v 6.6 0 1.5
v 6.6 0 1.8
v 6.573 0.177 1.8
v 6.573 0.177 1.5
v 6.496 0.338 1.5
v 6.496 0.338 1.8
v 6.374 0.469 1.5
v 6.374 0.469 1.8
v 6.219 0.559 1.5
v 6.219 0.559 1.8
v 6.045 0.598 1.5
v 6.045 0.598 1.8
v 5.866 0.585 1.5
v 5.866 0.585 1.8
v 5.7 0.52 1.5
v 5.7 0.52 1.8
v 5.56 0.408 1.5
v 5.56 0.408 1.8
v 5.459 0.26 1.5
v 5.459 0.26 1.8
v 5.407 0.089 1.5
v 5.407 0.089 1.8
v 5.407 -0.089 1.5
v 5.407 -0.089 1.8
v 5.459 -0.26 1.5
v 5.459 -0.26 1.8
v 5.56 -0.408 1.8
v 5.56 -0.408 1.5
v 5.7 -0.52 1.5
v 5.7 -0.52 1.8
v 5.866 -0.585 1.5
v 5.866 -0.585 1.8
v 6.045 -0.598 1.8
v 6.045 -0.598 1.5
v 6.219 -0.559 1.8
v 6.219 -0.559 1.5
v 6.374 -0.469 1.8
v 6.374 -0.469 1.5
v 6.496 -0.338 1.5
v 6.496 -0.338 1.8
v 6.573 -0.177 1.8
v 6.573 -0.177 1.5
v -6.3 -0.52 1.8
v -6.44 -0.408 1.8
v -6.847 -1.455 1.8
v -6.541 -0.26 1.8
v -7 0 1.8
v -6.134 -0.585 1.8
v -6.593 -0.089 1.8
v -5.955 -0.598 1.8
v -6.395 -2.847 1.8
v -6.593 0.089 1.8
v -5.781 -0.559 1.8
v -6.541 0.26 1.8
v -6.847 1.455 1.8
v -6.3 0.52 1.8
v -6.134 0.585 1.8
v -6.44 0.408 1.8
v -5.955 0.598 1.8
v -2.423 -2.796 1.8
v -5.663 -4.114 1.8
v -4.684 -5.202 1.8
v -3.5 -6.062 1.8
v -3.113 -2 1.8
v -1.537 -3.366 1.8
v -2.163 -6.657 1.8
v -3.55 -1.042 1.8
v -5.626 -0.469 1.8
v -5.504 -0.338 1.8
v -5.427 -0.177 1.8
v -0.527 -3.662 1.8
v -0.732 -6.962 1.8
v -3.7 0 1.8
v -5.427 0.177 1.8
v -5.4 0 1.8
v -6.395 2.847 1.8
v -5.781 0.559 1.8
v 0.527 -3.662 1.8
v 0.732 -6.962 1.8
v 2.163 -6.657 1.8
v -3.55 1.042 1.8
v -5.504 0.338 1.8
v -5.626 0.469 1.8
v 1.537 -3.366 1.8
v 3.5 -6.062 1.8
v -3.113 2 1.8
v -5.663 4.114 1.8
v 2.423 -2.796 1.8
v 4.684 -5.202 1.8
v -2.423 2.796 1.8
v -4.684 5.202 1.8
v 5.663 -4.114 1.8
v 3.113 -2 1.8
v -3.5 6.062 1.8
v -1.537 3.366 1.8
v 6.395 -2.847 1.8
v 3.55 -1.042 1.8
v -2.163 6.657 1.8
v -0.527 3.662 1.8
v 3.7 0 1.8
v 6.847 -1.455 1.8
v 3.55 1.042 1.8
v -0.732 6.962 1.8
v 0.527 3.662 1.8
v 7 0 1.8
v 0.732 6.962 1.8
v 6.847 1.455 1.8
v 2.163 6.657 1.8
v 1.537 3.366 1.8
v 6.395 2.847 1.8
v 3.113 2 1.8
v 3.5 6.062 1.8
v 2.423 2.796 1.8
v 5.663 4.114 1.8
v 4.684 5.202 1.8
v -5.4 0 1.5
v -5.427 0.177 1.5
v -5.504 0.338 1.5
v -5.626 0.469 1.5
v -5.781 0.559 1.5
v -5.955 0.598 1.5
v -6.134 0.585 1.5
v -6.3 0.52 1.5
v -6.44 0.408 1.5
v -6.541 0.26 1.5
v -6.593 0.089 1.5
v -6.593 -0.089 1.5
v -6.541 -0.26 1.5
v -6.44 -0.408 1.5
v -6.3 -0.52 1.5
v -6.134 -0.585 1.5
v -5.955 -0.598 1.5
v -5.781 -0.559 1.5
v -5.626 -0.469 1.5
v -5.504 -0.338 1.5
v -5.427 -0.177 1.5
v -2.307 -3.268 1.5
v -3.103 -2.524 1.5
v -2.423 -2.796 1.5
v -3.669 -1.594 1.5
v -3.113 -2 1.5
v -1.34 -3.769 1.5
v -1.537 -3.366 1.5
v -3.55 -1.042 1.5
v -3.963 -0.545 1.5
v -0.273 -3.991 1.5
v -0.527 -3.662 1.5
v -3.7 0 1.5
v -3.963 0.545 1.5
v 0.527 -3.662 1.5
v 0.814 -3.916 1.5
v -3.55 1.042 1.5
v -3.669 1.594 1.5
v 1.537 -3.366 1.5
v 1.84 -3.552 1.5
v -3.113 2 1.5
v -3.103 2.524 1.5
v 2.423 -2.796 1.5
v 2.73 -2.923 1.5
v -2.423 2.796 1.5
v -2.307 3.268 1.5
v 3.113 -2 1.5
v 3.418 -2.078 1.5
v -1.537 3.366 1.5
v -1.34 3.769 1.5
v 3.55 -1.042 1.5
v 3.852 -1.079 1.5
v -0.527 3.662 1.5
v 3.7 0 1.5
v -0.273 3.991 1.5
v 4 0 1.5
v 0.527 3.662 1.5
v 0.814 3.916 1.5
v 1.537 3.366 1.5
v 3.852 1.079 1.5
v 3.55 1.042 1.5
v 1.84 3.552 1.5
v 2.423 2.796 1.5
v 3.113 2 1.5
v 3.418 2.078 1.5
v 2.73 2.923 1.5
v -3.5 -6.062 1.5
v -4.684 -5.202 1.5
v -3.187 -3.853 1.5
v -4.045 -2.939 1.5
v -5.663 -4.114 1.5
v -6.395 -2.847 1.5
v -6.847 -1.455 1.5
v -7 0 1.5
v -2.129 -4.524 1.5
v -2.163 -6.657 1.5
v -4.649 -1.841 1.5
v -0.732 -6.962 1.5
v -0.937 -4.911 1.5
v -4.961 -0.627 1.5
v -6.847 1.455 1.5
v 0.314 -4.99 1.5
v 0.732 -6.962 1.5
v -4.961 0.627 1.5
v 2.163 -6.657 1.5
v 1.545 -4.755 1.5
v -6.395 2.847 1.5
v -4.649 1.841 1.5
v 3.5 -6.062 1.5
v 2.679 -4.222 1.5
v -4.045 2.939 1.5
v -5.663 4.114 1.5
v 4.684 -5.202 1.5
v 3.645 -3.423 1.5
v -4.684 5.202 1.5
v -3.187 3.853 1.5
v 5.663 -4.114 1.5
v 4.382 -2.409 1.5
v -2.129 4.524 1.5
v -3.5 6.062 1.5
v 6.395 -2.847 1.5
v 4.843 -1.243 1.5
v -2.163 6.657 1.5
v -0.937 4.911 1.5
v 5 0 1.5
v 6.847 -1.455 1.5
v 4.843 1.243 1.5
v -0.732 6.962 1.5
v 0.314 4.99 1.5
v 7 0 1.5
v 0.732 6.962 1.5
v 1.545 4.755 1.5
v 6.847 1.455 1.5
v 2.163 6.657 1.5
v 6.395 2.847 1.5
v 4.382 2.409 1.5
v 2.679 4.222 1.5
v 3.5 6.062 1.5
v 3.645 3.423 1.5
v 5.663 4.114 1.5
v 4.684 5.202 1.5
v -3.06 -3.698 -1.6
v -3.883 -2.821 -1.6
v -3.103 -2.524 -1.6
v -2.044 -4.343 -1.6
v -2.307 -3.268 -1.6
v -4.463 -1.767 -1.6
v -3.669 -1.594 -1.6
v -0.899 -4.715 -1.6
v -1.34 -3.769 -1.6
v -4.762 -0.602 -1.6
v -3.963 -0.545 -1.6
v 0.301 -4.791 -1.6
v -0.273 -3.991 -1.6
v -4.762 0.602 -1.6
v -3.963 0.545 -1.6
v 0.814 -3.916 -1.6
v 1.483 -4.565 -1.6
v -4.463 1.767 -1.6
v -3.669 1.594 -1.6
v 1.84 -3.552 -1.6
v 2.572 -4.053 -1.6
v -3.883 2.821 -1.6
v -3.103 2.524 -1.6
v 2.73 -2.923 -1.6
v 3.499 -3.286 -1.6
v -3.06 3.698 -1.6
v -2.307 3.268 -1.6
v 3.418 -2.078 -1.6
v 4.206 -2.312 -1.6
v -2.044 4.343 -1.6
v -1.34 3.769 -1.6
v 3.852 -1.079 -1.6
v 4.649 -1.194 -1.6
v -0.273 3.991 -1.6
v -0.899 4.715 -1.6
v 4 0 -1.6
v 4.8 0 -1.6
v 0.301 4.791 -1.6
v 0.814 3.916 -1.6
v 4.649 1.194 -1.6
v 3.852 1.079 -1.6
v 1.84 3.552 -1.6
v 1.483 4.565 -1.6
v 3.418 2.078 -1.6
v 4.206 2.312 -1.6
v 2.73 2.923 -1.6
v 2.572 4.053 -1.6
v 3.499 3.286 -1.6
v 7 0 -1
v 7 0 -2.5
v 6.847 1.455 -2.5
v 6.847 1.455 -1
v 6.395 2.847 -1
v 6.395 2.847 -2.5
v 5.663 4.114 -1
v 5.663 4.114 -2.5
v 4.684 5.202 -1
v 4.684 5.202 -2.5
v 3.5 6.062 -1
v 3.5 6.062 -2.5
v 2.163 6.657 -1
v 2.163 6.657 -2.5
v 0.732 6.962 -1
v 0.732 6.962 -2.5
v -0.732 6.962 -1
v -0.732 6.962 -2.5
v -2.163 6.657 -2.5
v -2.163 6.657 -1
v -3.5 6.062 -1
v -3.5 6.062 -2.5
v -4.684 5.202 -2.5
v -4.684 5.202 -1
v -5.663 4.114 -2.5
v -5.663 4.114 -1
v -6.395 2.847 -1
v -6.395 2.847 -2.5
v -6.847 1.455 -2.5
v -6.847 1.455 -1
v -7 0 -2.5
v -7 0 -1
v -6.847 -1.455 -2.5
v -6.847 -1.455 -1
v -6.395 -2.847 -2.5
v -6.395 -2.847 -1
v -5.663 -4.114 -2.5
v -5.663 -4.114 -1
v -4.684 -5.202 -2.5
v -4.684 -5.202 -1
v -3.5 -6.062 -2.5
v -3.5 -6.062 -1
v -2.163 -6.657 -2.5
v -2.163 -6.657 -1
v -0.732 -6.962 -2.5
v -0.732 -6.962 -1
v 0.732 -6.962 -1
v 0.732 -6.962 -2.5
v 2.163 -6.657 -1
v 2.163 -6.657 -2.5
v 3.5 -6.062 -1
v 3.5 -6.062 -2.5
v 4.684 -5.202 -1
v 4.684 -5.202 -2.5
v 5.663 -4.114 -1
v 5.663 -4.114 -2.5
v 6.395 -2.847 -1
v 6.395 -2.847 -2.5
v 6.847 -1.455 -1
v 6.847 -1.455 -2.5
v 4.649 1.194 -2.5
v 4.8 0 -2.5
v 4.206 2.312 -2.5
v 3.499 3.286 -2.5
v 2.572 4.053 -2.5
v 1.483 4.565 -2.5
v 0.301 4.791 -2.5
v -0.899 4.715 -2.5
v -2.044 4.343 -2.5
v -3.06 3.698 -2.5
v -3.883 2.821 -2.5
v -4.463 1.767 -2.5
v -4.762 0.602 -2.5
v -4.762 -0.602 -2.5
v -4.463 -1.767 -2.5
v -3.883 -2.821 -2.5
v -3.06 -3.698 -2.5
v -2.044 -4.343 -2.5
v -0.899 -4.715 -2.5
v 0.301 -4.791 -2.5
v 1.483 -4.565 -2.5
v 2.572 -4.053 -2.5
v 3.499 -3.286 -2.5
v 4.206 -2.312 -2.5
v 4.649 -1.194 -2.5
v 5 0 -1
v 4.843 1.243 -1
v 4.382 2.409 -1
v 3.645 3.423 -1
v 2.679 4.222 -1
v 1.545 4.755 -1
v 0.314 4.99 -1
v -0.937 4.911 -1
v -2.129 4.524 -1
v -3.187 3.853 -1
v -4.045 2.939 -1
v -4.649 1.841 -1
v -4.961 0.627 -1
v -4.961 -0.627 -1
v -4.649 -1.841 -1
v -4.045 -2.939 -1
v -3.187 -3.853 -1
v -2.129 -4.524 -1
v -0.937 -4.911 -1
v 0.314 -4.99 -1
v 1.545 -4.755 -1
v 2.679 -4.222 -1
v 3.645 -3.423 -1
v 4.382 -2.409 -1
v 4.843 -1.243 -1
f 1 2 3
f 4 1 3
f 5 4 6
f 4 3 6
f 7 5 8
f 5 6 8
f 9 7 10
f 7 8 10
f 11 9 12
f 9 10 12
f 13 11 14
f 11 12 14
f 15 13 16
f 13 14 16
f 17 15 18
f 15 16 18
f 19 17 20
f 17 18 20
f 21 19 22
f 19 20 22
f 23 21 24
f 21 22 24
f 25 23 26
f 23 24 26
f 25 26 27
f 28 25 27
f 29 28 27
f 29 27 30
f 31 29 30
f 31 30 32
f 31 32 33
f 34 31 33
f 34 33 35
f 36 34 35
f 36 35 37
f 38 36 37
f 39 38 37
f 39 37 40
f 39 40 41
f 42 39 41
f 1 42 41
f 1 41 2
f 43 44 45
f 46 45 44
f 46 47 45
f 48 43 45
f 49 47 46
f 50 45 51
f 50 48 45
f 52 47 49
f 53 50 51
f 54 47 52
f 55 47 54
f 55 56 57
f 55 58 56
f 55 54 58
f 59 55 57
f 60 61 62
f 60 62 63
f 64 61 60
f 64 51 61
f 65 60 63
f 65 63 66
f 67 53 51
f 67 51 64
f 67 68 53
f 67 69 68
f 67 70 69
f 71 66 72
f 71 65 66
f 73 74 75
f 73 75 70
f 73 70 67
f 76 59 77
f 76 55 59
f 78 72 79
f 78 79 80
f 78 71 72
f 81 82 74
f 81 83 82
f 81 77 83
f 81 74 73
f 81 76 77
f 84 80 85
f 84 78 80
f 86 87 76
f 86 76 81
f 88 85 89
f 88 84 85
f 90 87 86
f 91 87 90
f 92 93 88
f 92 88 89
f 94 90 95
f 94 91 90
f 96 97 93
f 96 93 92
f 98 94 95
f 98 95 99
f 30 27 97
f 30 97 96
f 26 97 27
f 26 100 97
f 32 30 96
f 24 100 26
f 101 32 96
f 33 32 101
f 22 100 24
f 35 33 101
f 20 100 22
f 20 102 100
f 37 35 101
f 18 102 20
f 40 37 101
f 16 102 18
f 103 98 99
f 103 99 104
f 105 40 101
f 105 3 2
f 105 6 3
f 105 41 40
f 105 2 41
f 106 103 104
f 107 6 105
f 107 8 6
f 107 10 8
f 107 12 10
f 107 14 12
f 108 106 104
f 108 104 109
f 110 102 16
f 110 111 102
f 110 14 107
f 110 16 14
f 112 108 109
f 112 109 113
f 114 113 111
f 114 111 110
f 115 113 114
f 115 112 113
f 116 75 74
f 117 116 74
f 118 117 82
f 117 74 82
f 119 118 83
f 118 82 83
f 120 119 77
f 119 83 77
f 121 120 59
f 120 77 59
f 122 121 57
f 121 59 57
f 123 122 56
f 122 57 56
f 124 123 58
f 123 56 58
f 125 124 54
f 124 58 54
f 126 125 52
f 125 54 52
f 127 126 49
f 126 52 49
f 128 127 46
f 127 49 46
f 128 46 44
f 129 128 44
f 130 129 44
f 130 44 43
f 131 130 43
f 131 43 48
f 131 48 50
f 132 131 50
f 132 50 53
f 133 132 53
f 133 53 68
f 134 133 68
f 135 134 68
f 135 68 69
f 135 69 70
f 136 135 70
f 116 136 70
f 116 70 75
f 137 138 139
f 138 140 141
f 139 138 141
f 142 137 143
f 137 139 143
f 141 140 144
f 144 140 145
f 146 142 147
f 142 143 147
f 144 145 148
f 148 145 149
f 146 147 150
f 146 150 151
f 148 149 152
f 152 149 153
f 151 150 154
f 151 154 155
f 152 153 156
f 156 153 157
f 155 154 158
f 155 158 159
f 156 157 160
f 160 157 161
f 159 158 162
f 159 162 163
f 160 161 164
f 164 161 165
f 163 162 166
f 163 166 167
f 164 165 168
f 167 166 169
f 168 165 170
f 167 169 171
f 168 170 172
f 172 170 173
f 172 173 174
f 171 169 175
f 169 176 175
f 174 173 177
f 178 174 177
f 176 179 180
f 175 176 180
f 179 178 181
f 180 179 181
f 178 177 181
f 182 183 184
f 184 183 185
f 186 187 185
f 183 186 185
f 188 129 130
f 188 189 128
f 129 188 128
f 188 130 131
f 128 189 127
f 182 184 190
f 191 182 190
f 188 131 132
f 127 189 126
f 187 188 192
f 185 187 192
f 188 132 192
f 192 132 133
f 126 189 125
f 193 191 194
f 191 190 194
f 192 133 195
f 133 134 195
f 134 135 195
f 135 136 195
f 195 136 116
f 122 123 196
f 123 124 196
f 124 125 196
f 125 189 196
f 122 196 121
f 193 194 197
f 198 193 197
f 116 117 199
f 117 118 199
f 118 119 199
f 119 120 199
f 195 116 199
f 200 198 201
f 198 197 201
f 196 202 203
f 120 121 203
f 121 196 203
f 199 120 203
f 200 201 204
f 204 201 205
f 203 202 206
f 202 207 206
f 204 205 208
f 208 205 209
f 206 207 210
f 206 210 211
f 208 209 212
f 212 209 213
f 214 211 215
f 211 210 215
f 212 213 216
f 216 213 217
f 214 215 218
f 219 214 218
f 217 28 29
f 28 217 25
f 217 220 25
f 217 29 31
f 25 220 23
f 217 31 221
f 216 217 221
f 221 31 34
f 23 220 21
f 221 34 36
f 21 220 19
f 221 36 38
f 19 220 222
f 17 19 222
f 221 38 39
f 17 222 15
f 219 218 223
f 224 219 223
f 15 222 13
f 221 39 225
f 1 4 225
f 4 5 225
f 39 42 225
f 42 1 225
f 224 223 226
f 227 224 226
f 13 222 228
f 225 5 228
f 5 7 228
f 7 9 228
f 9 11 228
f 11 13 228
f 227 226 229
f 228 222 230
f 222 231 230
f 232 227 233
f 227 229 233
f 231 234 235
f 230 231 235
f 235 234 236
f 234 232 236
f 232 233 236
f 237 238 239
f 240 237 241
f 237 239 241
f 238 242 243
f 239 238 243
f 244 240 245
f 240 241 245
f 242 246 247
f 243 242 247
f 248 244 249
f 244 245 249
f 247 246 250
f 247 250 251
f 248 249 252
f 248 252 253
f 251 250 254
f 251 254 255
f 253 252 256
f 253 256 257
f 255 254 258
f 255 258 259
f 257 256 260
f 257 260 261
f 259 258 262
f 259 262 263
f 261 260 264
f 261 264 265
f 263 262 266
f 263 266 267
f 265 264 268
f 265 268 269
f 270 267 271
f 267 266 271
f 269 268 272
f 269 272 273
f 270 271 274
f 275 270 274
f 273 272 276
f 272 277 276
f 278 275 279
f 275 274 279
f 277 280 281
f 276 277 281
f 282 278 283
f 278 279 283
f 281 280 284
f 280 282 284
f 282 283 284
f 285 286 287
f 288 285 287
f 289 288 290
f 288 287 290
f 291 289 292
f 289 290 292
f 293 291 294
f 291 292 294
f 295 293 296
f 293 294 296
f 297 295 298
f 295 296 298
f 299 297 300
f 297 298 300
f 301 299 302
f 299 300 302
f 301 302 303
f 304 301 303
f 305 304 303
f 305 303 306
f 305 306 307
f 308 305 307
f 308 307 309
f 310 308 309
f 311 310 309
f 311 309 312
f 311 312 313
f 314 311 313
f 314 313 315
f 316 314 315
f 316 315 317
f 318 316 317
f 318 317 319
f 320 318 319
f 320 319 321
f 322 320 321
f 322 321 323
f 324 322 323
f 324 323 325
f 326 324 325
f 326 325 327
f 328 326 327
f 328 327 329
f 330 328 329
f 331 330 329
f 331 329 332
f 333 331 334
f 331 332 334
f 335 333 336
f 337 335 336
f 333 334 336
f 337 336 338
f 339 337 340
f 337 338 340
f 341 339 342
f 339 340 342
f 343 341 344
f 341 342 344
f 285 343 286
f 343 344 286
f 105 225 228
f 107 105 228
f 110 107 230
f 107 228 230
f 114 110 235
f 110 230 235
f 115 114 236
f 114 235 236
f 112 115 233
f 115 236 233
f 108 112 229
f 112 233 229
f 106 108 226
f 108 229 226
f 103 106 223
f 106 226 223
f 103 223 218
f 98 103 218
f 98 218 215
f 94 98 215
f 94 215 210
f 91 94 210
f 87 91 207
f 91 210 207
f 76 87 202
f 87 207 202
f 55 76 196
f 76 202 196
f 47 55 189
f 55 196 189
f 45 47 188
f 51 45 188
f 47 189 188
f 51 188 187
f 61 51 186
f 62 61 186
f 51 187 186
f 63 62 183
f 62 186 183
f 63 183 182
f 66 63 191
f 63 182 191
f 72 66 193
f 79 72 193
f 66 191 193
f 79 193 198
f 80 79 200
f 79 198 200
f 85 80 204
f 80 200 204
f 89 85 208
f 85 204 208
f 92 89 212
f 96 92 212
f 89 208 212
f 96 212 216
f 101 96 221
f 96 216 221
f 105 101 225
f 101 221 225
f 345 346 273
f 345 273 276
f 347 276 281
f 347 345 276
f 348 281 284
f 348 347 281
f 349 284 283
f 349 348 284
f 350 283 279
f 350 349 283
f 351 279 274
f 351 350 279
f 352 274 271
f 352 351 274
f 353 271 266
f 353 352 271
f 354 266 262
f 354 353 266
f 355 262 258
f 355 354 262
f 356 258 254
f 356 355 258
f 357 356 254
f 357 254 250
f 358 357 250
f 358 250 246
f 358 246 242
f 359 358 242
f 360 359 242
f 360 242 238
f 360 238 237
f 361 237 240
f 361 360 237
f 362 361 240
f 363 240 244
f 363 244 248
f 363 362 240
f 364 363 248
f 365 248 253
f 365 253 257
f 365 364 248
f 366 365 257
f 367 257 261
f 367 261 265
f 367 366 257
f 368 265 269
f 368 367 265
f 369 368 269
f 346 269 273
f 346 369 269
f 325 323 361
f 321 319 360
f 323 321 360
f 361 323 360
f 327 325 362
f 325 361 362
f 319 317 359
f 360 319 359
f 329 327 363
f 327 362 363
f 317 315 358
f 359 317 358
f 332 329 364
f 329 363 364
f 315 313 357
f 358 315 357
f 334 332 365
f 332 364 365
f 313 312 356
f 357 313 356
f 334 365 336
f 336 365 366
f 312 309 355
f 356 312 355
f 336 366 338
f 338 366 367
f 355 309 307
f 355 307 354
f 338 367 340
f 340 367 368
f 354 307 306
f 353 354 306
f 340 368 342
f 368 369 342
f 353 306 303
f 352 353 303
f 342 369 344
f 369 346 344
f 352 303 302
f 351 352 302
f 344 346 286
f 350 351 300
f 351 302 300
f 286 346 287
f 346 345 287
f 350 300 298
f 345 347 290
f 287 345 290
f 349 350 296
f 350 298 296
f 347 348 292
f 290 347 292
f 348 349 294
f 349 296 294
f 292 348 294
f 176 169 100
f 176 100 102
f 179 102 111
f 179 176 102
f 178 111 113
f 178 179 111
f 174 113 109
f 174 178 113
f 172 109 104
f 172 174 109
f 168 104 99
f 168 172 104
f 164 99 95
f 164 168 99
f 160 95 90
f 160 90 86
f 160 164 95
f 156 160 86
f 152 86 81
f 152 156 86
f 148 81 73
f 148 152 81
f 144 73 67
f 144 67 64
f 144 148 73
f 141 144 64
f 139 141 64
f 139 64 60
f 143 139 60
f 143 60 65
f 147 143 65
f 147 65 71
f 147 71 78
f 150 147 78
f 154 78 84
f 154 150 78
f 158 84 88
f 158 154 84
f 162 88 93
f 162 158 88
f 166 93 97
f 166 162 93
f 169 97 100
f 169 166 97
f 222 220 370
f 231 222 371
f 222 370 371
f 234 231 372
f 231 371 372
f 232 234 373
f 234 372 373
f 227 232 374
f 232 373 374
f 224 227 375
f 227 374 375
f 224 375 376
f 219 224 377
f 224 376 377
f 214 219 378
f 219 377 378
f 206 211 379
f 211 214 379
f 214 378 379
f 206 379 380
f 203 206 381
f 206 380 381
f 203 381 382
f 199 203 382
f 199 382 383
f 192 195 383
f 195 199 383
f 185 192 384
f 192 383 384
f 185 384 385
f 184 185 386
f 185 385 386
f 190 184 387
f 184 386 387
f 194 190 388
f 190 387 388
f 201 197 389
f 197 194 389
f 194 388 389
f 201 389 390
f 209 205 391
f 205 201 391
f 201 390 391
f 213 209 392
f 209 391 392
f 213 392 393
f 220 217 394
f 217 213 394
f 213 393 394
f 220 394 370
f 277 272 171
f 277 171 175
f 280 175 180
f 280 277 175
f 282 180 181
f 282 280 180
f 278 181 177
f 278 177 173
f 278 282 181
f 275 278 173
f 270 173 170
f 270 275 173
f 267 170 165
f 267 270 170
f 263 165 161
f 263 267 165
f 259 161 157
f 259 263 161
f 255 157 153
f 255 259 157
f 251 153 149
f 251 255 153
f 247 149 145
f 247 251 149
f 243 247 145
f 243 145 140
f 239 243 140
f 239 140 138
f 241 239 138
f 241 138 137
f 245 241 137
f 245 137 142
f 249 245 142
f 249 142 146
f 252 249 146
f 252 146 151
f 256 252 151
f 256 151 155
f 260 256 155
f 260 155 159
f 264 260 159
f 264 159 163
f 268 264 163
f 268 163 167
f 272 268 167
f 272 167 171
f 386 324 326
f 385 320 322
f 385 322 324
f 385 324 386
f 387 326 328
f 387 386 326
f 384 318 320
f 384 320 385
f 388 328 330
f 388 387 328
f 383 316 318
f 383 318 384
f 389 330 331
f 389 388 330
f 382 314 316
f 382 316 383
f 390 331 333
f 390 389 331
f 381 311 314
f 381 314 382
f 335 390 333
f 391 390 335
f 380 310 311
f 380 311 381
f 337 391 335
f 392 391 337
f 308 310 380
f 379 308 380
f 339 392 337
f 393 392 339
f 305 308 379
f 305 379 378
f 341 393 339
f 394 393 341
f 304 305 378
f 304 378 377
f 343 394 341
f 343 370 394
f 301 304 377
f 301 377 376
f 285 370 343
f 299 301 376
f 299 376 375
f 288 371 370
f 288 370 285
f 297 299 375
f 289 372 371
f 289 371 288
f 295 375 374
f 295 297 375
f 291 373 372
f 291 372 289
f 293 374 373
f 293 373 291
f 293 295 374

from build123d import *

# Parameters (mm, degrees)
D10_PILOT_AND_M10X0P5_THREAD_ENVELOPE_START = -1
SKETCH1_R                                   = 5
SKETCH1_R_2                                 = 4
D10_PILOT_AND_M10X0P5_THREAD_ENVELOPE_DEPTH = 2.5
OUTER_RACE_INNER_SHOULDER_ID7P4_START       = 1.5
SKETCH2_R                                   = 5
SKETCH2_R_2                                 = 3.7
OUTER_RACE_INNER_SHOULDER_ID7P4_DEPTH       = 0.3
INBOARD_G10_RETENTION_FLANGE_H0P3_START     = 1.5
SKETCH3_R                                   = 7
SKETCH3_R_2                                 = 3.7
INBOARD_G10_RETENTION_FLANGE_H0P3_DEPTH     = 0.3
M14X0P5_BEARING_CAP_BOSS_START              = -1.6
SKETCH4_R                                   = 7
SKETCH4_R_2                                 = 4
M14X0P5_BEARING_CAP_BOSS_DEPTH              = 0.6
FLANGED_RACE_POCKET_D9P6_START              = -2.5
SKETCH5_R                                   = 7
SKETCH5_R_2                                 = 4.8
FLANGED_RACE_POCKET_D9P6_DEPTH              = 0.9
SKETCH6_R                                   = 0.6
TWO_PIN_WRENCH_HOLES_D1P2_DEPTH             = 0.301


with BuildPart() as part:
    # Sketch1 → D10_Pilot_And_M10x0p5_Thread_Envelope (new body)
    with BuildSketch(Plane.XY.offset(D10_PILOT_AND_M10X0P5_THREAD_ENVELOPE_START)):
        Circle(SKETCH1_R)
        Circle(SKETCH1_R_2, mode=Mode.SUBTRACT)
    extrude(amount=D10_PILOT_AND_M10X0P5_THREAD_ENVELOPE_DEPTH)

    # Sketch2 → Outer_Race_Inner_Shoulder_ID7p4 (add)
    with BuildSketch(Plane.XY.offset(OUTER_RACE_INNER_SHOULDER_ID7P4_START)):
        Circle(SKETCH2_R)
        Circle(SKETCH2_R_2, mode=Mode.SUBTRACT)
    extrude(amount=OUTER_RACE_INNER_SHOULDER_ID7P4_DEPTH)

    # Sketch3 → Inboard_G10_Retention_Flange_H0p3 (add)
    with BuildSketch(Plane.XY.offset(INBOARD_G10_RETENTION_FLANGE_H0P3_START)):
        Circle(SKETCH3_R)
        Circle(SKETCH3_R_2, mode=Mode.SUBTRACT)
    extrude(amount=INBOARD_G10_RETENTION_FLANGE_H0P3_DEPTH)

    # Sketch4 → M14x0p5_Bearing_Cap_Boss (add)
    with BuildSketch(Plane.XY.offset(M14X0P5_BEARING_CAP_BOSS_START)):
        Circle(SKETCH4_R)
        Circle(SKETCH4_R_2, mode=Mode.SUBTRACT)
    extrude(amount=M14X0P5_BEARING_CAP_BOSS_DEPTH)

    # Sketch5 → Flanged_Race_Pocket_D9p6 (add)
    with BuildSketch(Plane.XY.offset(FLANGED_RACE_POCKET_D9P6_START)):
        Circle(SKETCH5_R)
        Circle(SKETCH5_R_2, mode=Mode.SUBTRACT)
    extrude(amount=FLANGED_RACE_POCKET_D9P6_DEPTH)

    # Sketch6 → Two_Pin_Wrench_Holes_D1p2 (cut)
    with BuildSketch(Plane.XY.offset(1.8)):
        with Locations((-6, 0)):
            Circle(SKETCH6_R)
        with Locations((6, 0)):
            Circle(SKETCH6_R)
    extrude(amount=-TWO_PIN_WRENCH_HOLES_D1P2_DEPTH, mode=Mode.SUBTRACT)


solid = part.part
